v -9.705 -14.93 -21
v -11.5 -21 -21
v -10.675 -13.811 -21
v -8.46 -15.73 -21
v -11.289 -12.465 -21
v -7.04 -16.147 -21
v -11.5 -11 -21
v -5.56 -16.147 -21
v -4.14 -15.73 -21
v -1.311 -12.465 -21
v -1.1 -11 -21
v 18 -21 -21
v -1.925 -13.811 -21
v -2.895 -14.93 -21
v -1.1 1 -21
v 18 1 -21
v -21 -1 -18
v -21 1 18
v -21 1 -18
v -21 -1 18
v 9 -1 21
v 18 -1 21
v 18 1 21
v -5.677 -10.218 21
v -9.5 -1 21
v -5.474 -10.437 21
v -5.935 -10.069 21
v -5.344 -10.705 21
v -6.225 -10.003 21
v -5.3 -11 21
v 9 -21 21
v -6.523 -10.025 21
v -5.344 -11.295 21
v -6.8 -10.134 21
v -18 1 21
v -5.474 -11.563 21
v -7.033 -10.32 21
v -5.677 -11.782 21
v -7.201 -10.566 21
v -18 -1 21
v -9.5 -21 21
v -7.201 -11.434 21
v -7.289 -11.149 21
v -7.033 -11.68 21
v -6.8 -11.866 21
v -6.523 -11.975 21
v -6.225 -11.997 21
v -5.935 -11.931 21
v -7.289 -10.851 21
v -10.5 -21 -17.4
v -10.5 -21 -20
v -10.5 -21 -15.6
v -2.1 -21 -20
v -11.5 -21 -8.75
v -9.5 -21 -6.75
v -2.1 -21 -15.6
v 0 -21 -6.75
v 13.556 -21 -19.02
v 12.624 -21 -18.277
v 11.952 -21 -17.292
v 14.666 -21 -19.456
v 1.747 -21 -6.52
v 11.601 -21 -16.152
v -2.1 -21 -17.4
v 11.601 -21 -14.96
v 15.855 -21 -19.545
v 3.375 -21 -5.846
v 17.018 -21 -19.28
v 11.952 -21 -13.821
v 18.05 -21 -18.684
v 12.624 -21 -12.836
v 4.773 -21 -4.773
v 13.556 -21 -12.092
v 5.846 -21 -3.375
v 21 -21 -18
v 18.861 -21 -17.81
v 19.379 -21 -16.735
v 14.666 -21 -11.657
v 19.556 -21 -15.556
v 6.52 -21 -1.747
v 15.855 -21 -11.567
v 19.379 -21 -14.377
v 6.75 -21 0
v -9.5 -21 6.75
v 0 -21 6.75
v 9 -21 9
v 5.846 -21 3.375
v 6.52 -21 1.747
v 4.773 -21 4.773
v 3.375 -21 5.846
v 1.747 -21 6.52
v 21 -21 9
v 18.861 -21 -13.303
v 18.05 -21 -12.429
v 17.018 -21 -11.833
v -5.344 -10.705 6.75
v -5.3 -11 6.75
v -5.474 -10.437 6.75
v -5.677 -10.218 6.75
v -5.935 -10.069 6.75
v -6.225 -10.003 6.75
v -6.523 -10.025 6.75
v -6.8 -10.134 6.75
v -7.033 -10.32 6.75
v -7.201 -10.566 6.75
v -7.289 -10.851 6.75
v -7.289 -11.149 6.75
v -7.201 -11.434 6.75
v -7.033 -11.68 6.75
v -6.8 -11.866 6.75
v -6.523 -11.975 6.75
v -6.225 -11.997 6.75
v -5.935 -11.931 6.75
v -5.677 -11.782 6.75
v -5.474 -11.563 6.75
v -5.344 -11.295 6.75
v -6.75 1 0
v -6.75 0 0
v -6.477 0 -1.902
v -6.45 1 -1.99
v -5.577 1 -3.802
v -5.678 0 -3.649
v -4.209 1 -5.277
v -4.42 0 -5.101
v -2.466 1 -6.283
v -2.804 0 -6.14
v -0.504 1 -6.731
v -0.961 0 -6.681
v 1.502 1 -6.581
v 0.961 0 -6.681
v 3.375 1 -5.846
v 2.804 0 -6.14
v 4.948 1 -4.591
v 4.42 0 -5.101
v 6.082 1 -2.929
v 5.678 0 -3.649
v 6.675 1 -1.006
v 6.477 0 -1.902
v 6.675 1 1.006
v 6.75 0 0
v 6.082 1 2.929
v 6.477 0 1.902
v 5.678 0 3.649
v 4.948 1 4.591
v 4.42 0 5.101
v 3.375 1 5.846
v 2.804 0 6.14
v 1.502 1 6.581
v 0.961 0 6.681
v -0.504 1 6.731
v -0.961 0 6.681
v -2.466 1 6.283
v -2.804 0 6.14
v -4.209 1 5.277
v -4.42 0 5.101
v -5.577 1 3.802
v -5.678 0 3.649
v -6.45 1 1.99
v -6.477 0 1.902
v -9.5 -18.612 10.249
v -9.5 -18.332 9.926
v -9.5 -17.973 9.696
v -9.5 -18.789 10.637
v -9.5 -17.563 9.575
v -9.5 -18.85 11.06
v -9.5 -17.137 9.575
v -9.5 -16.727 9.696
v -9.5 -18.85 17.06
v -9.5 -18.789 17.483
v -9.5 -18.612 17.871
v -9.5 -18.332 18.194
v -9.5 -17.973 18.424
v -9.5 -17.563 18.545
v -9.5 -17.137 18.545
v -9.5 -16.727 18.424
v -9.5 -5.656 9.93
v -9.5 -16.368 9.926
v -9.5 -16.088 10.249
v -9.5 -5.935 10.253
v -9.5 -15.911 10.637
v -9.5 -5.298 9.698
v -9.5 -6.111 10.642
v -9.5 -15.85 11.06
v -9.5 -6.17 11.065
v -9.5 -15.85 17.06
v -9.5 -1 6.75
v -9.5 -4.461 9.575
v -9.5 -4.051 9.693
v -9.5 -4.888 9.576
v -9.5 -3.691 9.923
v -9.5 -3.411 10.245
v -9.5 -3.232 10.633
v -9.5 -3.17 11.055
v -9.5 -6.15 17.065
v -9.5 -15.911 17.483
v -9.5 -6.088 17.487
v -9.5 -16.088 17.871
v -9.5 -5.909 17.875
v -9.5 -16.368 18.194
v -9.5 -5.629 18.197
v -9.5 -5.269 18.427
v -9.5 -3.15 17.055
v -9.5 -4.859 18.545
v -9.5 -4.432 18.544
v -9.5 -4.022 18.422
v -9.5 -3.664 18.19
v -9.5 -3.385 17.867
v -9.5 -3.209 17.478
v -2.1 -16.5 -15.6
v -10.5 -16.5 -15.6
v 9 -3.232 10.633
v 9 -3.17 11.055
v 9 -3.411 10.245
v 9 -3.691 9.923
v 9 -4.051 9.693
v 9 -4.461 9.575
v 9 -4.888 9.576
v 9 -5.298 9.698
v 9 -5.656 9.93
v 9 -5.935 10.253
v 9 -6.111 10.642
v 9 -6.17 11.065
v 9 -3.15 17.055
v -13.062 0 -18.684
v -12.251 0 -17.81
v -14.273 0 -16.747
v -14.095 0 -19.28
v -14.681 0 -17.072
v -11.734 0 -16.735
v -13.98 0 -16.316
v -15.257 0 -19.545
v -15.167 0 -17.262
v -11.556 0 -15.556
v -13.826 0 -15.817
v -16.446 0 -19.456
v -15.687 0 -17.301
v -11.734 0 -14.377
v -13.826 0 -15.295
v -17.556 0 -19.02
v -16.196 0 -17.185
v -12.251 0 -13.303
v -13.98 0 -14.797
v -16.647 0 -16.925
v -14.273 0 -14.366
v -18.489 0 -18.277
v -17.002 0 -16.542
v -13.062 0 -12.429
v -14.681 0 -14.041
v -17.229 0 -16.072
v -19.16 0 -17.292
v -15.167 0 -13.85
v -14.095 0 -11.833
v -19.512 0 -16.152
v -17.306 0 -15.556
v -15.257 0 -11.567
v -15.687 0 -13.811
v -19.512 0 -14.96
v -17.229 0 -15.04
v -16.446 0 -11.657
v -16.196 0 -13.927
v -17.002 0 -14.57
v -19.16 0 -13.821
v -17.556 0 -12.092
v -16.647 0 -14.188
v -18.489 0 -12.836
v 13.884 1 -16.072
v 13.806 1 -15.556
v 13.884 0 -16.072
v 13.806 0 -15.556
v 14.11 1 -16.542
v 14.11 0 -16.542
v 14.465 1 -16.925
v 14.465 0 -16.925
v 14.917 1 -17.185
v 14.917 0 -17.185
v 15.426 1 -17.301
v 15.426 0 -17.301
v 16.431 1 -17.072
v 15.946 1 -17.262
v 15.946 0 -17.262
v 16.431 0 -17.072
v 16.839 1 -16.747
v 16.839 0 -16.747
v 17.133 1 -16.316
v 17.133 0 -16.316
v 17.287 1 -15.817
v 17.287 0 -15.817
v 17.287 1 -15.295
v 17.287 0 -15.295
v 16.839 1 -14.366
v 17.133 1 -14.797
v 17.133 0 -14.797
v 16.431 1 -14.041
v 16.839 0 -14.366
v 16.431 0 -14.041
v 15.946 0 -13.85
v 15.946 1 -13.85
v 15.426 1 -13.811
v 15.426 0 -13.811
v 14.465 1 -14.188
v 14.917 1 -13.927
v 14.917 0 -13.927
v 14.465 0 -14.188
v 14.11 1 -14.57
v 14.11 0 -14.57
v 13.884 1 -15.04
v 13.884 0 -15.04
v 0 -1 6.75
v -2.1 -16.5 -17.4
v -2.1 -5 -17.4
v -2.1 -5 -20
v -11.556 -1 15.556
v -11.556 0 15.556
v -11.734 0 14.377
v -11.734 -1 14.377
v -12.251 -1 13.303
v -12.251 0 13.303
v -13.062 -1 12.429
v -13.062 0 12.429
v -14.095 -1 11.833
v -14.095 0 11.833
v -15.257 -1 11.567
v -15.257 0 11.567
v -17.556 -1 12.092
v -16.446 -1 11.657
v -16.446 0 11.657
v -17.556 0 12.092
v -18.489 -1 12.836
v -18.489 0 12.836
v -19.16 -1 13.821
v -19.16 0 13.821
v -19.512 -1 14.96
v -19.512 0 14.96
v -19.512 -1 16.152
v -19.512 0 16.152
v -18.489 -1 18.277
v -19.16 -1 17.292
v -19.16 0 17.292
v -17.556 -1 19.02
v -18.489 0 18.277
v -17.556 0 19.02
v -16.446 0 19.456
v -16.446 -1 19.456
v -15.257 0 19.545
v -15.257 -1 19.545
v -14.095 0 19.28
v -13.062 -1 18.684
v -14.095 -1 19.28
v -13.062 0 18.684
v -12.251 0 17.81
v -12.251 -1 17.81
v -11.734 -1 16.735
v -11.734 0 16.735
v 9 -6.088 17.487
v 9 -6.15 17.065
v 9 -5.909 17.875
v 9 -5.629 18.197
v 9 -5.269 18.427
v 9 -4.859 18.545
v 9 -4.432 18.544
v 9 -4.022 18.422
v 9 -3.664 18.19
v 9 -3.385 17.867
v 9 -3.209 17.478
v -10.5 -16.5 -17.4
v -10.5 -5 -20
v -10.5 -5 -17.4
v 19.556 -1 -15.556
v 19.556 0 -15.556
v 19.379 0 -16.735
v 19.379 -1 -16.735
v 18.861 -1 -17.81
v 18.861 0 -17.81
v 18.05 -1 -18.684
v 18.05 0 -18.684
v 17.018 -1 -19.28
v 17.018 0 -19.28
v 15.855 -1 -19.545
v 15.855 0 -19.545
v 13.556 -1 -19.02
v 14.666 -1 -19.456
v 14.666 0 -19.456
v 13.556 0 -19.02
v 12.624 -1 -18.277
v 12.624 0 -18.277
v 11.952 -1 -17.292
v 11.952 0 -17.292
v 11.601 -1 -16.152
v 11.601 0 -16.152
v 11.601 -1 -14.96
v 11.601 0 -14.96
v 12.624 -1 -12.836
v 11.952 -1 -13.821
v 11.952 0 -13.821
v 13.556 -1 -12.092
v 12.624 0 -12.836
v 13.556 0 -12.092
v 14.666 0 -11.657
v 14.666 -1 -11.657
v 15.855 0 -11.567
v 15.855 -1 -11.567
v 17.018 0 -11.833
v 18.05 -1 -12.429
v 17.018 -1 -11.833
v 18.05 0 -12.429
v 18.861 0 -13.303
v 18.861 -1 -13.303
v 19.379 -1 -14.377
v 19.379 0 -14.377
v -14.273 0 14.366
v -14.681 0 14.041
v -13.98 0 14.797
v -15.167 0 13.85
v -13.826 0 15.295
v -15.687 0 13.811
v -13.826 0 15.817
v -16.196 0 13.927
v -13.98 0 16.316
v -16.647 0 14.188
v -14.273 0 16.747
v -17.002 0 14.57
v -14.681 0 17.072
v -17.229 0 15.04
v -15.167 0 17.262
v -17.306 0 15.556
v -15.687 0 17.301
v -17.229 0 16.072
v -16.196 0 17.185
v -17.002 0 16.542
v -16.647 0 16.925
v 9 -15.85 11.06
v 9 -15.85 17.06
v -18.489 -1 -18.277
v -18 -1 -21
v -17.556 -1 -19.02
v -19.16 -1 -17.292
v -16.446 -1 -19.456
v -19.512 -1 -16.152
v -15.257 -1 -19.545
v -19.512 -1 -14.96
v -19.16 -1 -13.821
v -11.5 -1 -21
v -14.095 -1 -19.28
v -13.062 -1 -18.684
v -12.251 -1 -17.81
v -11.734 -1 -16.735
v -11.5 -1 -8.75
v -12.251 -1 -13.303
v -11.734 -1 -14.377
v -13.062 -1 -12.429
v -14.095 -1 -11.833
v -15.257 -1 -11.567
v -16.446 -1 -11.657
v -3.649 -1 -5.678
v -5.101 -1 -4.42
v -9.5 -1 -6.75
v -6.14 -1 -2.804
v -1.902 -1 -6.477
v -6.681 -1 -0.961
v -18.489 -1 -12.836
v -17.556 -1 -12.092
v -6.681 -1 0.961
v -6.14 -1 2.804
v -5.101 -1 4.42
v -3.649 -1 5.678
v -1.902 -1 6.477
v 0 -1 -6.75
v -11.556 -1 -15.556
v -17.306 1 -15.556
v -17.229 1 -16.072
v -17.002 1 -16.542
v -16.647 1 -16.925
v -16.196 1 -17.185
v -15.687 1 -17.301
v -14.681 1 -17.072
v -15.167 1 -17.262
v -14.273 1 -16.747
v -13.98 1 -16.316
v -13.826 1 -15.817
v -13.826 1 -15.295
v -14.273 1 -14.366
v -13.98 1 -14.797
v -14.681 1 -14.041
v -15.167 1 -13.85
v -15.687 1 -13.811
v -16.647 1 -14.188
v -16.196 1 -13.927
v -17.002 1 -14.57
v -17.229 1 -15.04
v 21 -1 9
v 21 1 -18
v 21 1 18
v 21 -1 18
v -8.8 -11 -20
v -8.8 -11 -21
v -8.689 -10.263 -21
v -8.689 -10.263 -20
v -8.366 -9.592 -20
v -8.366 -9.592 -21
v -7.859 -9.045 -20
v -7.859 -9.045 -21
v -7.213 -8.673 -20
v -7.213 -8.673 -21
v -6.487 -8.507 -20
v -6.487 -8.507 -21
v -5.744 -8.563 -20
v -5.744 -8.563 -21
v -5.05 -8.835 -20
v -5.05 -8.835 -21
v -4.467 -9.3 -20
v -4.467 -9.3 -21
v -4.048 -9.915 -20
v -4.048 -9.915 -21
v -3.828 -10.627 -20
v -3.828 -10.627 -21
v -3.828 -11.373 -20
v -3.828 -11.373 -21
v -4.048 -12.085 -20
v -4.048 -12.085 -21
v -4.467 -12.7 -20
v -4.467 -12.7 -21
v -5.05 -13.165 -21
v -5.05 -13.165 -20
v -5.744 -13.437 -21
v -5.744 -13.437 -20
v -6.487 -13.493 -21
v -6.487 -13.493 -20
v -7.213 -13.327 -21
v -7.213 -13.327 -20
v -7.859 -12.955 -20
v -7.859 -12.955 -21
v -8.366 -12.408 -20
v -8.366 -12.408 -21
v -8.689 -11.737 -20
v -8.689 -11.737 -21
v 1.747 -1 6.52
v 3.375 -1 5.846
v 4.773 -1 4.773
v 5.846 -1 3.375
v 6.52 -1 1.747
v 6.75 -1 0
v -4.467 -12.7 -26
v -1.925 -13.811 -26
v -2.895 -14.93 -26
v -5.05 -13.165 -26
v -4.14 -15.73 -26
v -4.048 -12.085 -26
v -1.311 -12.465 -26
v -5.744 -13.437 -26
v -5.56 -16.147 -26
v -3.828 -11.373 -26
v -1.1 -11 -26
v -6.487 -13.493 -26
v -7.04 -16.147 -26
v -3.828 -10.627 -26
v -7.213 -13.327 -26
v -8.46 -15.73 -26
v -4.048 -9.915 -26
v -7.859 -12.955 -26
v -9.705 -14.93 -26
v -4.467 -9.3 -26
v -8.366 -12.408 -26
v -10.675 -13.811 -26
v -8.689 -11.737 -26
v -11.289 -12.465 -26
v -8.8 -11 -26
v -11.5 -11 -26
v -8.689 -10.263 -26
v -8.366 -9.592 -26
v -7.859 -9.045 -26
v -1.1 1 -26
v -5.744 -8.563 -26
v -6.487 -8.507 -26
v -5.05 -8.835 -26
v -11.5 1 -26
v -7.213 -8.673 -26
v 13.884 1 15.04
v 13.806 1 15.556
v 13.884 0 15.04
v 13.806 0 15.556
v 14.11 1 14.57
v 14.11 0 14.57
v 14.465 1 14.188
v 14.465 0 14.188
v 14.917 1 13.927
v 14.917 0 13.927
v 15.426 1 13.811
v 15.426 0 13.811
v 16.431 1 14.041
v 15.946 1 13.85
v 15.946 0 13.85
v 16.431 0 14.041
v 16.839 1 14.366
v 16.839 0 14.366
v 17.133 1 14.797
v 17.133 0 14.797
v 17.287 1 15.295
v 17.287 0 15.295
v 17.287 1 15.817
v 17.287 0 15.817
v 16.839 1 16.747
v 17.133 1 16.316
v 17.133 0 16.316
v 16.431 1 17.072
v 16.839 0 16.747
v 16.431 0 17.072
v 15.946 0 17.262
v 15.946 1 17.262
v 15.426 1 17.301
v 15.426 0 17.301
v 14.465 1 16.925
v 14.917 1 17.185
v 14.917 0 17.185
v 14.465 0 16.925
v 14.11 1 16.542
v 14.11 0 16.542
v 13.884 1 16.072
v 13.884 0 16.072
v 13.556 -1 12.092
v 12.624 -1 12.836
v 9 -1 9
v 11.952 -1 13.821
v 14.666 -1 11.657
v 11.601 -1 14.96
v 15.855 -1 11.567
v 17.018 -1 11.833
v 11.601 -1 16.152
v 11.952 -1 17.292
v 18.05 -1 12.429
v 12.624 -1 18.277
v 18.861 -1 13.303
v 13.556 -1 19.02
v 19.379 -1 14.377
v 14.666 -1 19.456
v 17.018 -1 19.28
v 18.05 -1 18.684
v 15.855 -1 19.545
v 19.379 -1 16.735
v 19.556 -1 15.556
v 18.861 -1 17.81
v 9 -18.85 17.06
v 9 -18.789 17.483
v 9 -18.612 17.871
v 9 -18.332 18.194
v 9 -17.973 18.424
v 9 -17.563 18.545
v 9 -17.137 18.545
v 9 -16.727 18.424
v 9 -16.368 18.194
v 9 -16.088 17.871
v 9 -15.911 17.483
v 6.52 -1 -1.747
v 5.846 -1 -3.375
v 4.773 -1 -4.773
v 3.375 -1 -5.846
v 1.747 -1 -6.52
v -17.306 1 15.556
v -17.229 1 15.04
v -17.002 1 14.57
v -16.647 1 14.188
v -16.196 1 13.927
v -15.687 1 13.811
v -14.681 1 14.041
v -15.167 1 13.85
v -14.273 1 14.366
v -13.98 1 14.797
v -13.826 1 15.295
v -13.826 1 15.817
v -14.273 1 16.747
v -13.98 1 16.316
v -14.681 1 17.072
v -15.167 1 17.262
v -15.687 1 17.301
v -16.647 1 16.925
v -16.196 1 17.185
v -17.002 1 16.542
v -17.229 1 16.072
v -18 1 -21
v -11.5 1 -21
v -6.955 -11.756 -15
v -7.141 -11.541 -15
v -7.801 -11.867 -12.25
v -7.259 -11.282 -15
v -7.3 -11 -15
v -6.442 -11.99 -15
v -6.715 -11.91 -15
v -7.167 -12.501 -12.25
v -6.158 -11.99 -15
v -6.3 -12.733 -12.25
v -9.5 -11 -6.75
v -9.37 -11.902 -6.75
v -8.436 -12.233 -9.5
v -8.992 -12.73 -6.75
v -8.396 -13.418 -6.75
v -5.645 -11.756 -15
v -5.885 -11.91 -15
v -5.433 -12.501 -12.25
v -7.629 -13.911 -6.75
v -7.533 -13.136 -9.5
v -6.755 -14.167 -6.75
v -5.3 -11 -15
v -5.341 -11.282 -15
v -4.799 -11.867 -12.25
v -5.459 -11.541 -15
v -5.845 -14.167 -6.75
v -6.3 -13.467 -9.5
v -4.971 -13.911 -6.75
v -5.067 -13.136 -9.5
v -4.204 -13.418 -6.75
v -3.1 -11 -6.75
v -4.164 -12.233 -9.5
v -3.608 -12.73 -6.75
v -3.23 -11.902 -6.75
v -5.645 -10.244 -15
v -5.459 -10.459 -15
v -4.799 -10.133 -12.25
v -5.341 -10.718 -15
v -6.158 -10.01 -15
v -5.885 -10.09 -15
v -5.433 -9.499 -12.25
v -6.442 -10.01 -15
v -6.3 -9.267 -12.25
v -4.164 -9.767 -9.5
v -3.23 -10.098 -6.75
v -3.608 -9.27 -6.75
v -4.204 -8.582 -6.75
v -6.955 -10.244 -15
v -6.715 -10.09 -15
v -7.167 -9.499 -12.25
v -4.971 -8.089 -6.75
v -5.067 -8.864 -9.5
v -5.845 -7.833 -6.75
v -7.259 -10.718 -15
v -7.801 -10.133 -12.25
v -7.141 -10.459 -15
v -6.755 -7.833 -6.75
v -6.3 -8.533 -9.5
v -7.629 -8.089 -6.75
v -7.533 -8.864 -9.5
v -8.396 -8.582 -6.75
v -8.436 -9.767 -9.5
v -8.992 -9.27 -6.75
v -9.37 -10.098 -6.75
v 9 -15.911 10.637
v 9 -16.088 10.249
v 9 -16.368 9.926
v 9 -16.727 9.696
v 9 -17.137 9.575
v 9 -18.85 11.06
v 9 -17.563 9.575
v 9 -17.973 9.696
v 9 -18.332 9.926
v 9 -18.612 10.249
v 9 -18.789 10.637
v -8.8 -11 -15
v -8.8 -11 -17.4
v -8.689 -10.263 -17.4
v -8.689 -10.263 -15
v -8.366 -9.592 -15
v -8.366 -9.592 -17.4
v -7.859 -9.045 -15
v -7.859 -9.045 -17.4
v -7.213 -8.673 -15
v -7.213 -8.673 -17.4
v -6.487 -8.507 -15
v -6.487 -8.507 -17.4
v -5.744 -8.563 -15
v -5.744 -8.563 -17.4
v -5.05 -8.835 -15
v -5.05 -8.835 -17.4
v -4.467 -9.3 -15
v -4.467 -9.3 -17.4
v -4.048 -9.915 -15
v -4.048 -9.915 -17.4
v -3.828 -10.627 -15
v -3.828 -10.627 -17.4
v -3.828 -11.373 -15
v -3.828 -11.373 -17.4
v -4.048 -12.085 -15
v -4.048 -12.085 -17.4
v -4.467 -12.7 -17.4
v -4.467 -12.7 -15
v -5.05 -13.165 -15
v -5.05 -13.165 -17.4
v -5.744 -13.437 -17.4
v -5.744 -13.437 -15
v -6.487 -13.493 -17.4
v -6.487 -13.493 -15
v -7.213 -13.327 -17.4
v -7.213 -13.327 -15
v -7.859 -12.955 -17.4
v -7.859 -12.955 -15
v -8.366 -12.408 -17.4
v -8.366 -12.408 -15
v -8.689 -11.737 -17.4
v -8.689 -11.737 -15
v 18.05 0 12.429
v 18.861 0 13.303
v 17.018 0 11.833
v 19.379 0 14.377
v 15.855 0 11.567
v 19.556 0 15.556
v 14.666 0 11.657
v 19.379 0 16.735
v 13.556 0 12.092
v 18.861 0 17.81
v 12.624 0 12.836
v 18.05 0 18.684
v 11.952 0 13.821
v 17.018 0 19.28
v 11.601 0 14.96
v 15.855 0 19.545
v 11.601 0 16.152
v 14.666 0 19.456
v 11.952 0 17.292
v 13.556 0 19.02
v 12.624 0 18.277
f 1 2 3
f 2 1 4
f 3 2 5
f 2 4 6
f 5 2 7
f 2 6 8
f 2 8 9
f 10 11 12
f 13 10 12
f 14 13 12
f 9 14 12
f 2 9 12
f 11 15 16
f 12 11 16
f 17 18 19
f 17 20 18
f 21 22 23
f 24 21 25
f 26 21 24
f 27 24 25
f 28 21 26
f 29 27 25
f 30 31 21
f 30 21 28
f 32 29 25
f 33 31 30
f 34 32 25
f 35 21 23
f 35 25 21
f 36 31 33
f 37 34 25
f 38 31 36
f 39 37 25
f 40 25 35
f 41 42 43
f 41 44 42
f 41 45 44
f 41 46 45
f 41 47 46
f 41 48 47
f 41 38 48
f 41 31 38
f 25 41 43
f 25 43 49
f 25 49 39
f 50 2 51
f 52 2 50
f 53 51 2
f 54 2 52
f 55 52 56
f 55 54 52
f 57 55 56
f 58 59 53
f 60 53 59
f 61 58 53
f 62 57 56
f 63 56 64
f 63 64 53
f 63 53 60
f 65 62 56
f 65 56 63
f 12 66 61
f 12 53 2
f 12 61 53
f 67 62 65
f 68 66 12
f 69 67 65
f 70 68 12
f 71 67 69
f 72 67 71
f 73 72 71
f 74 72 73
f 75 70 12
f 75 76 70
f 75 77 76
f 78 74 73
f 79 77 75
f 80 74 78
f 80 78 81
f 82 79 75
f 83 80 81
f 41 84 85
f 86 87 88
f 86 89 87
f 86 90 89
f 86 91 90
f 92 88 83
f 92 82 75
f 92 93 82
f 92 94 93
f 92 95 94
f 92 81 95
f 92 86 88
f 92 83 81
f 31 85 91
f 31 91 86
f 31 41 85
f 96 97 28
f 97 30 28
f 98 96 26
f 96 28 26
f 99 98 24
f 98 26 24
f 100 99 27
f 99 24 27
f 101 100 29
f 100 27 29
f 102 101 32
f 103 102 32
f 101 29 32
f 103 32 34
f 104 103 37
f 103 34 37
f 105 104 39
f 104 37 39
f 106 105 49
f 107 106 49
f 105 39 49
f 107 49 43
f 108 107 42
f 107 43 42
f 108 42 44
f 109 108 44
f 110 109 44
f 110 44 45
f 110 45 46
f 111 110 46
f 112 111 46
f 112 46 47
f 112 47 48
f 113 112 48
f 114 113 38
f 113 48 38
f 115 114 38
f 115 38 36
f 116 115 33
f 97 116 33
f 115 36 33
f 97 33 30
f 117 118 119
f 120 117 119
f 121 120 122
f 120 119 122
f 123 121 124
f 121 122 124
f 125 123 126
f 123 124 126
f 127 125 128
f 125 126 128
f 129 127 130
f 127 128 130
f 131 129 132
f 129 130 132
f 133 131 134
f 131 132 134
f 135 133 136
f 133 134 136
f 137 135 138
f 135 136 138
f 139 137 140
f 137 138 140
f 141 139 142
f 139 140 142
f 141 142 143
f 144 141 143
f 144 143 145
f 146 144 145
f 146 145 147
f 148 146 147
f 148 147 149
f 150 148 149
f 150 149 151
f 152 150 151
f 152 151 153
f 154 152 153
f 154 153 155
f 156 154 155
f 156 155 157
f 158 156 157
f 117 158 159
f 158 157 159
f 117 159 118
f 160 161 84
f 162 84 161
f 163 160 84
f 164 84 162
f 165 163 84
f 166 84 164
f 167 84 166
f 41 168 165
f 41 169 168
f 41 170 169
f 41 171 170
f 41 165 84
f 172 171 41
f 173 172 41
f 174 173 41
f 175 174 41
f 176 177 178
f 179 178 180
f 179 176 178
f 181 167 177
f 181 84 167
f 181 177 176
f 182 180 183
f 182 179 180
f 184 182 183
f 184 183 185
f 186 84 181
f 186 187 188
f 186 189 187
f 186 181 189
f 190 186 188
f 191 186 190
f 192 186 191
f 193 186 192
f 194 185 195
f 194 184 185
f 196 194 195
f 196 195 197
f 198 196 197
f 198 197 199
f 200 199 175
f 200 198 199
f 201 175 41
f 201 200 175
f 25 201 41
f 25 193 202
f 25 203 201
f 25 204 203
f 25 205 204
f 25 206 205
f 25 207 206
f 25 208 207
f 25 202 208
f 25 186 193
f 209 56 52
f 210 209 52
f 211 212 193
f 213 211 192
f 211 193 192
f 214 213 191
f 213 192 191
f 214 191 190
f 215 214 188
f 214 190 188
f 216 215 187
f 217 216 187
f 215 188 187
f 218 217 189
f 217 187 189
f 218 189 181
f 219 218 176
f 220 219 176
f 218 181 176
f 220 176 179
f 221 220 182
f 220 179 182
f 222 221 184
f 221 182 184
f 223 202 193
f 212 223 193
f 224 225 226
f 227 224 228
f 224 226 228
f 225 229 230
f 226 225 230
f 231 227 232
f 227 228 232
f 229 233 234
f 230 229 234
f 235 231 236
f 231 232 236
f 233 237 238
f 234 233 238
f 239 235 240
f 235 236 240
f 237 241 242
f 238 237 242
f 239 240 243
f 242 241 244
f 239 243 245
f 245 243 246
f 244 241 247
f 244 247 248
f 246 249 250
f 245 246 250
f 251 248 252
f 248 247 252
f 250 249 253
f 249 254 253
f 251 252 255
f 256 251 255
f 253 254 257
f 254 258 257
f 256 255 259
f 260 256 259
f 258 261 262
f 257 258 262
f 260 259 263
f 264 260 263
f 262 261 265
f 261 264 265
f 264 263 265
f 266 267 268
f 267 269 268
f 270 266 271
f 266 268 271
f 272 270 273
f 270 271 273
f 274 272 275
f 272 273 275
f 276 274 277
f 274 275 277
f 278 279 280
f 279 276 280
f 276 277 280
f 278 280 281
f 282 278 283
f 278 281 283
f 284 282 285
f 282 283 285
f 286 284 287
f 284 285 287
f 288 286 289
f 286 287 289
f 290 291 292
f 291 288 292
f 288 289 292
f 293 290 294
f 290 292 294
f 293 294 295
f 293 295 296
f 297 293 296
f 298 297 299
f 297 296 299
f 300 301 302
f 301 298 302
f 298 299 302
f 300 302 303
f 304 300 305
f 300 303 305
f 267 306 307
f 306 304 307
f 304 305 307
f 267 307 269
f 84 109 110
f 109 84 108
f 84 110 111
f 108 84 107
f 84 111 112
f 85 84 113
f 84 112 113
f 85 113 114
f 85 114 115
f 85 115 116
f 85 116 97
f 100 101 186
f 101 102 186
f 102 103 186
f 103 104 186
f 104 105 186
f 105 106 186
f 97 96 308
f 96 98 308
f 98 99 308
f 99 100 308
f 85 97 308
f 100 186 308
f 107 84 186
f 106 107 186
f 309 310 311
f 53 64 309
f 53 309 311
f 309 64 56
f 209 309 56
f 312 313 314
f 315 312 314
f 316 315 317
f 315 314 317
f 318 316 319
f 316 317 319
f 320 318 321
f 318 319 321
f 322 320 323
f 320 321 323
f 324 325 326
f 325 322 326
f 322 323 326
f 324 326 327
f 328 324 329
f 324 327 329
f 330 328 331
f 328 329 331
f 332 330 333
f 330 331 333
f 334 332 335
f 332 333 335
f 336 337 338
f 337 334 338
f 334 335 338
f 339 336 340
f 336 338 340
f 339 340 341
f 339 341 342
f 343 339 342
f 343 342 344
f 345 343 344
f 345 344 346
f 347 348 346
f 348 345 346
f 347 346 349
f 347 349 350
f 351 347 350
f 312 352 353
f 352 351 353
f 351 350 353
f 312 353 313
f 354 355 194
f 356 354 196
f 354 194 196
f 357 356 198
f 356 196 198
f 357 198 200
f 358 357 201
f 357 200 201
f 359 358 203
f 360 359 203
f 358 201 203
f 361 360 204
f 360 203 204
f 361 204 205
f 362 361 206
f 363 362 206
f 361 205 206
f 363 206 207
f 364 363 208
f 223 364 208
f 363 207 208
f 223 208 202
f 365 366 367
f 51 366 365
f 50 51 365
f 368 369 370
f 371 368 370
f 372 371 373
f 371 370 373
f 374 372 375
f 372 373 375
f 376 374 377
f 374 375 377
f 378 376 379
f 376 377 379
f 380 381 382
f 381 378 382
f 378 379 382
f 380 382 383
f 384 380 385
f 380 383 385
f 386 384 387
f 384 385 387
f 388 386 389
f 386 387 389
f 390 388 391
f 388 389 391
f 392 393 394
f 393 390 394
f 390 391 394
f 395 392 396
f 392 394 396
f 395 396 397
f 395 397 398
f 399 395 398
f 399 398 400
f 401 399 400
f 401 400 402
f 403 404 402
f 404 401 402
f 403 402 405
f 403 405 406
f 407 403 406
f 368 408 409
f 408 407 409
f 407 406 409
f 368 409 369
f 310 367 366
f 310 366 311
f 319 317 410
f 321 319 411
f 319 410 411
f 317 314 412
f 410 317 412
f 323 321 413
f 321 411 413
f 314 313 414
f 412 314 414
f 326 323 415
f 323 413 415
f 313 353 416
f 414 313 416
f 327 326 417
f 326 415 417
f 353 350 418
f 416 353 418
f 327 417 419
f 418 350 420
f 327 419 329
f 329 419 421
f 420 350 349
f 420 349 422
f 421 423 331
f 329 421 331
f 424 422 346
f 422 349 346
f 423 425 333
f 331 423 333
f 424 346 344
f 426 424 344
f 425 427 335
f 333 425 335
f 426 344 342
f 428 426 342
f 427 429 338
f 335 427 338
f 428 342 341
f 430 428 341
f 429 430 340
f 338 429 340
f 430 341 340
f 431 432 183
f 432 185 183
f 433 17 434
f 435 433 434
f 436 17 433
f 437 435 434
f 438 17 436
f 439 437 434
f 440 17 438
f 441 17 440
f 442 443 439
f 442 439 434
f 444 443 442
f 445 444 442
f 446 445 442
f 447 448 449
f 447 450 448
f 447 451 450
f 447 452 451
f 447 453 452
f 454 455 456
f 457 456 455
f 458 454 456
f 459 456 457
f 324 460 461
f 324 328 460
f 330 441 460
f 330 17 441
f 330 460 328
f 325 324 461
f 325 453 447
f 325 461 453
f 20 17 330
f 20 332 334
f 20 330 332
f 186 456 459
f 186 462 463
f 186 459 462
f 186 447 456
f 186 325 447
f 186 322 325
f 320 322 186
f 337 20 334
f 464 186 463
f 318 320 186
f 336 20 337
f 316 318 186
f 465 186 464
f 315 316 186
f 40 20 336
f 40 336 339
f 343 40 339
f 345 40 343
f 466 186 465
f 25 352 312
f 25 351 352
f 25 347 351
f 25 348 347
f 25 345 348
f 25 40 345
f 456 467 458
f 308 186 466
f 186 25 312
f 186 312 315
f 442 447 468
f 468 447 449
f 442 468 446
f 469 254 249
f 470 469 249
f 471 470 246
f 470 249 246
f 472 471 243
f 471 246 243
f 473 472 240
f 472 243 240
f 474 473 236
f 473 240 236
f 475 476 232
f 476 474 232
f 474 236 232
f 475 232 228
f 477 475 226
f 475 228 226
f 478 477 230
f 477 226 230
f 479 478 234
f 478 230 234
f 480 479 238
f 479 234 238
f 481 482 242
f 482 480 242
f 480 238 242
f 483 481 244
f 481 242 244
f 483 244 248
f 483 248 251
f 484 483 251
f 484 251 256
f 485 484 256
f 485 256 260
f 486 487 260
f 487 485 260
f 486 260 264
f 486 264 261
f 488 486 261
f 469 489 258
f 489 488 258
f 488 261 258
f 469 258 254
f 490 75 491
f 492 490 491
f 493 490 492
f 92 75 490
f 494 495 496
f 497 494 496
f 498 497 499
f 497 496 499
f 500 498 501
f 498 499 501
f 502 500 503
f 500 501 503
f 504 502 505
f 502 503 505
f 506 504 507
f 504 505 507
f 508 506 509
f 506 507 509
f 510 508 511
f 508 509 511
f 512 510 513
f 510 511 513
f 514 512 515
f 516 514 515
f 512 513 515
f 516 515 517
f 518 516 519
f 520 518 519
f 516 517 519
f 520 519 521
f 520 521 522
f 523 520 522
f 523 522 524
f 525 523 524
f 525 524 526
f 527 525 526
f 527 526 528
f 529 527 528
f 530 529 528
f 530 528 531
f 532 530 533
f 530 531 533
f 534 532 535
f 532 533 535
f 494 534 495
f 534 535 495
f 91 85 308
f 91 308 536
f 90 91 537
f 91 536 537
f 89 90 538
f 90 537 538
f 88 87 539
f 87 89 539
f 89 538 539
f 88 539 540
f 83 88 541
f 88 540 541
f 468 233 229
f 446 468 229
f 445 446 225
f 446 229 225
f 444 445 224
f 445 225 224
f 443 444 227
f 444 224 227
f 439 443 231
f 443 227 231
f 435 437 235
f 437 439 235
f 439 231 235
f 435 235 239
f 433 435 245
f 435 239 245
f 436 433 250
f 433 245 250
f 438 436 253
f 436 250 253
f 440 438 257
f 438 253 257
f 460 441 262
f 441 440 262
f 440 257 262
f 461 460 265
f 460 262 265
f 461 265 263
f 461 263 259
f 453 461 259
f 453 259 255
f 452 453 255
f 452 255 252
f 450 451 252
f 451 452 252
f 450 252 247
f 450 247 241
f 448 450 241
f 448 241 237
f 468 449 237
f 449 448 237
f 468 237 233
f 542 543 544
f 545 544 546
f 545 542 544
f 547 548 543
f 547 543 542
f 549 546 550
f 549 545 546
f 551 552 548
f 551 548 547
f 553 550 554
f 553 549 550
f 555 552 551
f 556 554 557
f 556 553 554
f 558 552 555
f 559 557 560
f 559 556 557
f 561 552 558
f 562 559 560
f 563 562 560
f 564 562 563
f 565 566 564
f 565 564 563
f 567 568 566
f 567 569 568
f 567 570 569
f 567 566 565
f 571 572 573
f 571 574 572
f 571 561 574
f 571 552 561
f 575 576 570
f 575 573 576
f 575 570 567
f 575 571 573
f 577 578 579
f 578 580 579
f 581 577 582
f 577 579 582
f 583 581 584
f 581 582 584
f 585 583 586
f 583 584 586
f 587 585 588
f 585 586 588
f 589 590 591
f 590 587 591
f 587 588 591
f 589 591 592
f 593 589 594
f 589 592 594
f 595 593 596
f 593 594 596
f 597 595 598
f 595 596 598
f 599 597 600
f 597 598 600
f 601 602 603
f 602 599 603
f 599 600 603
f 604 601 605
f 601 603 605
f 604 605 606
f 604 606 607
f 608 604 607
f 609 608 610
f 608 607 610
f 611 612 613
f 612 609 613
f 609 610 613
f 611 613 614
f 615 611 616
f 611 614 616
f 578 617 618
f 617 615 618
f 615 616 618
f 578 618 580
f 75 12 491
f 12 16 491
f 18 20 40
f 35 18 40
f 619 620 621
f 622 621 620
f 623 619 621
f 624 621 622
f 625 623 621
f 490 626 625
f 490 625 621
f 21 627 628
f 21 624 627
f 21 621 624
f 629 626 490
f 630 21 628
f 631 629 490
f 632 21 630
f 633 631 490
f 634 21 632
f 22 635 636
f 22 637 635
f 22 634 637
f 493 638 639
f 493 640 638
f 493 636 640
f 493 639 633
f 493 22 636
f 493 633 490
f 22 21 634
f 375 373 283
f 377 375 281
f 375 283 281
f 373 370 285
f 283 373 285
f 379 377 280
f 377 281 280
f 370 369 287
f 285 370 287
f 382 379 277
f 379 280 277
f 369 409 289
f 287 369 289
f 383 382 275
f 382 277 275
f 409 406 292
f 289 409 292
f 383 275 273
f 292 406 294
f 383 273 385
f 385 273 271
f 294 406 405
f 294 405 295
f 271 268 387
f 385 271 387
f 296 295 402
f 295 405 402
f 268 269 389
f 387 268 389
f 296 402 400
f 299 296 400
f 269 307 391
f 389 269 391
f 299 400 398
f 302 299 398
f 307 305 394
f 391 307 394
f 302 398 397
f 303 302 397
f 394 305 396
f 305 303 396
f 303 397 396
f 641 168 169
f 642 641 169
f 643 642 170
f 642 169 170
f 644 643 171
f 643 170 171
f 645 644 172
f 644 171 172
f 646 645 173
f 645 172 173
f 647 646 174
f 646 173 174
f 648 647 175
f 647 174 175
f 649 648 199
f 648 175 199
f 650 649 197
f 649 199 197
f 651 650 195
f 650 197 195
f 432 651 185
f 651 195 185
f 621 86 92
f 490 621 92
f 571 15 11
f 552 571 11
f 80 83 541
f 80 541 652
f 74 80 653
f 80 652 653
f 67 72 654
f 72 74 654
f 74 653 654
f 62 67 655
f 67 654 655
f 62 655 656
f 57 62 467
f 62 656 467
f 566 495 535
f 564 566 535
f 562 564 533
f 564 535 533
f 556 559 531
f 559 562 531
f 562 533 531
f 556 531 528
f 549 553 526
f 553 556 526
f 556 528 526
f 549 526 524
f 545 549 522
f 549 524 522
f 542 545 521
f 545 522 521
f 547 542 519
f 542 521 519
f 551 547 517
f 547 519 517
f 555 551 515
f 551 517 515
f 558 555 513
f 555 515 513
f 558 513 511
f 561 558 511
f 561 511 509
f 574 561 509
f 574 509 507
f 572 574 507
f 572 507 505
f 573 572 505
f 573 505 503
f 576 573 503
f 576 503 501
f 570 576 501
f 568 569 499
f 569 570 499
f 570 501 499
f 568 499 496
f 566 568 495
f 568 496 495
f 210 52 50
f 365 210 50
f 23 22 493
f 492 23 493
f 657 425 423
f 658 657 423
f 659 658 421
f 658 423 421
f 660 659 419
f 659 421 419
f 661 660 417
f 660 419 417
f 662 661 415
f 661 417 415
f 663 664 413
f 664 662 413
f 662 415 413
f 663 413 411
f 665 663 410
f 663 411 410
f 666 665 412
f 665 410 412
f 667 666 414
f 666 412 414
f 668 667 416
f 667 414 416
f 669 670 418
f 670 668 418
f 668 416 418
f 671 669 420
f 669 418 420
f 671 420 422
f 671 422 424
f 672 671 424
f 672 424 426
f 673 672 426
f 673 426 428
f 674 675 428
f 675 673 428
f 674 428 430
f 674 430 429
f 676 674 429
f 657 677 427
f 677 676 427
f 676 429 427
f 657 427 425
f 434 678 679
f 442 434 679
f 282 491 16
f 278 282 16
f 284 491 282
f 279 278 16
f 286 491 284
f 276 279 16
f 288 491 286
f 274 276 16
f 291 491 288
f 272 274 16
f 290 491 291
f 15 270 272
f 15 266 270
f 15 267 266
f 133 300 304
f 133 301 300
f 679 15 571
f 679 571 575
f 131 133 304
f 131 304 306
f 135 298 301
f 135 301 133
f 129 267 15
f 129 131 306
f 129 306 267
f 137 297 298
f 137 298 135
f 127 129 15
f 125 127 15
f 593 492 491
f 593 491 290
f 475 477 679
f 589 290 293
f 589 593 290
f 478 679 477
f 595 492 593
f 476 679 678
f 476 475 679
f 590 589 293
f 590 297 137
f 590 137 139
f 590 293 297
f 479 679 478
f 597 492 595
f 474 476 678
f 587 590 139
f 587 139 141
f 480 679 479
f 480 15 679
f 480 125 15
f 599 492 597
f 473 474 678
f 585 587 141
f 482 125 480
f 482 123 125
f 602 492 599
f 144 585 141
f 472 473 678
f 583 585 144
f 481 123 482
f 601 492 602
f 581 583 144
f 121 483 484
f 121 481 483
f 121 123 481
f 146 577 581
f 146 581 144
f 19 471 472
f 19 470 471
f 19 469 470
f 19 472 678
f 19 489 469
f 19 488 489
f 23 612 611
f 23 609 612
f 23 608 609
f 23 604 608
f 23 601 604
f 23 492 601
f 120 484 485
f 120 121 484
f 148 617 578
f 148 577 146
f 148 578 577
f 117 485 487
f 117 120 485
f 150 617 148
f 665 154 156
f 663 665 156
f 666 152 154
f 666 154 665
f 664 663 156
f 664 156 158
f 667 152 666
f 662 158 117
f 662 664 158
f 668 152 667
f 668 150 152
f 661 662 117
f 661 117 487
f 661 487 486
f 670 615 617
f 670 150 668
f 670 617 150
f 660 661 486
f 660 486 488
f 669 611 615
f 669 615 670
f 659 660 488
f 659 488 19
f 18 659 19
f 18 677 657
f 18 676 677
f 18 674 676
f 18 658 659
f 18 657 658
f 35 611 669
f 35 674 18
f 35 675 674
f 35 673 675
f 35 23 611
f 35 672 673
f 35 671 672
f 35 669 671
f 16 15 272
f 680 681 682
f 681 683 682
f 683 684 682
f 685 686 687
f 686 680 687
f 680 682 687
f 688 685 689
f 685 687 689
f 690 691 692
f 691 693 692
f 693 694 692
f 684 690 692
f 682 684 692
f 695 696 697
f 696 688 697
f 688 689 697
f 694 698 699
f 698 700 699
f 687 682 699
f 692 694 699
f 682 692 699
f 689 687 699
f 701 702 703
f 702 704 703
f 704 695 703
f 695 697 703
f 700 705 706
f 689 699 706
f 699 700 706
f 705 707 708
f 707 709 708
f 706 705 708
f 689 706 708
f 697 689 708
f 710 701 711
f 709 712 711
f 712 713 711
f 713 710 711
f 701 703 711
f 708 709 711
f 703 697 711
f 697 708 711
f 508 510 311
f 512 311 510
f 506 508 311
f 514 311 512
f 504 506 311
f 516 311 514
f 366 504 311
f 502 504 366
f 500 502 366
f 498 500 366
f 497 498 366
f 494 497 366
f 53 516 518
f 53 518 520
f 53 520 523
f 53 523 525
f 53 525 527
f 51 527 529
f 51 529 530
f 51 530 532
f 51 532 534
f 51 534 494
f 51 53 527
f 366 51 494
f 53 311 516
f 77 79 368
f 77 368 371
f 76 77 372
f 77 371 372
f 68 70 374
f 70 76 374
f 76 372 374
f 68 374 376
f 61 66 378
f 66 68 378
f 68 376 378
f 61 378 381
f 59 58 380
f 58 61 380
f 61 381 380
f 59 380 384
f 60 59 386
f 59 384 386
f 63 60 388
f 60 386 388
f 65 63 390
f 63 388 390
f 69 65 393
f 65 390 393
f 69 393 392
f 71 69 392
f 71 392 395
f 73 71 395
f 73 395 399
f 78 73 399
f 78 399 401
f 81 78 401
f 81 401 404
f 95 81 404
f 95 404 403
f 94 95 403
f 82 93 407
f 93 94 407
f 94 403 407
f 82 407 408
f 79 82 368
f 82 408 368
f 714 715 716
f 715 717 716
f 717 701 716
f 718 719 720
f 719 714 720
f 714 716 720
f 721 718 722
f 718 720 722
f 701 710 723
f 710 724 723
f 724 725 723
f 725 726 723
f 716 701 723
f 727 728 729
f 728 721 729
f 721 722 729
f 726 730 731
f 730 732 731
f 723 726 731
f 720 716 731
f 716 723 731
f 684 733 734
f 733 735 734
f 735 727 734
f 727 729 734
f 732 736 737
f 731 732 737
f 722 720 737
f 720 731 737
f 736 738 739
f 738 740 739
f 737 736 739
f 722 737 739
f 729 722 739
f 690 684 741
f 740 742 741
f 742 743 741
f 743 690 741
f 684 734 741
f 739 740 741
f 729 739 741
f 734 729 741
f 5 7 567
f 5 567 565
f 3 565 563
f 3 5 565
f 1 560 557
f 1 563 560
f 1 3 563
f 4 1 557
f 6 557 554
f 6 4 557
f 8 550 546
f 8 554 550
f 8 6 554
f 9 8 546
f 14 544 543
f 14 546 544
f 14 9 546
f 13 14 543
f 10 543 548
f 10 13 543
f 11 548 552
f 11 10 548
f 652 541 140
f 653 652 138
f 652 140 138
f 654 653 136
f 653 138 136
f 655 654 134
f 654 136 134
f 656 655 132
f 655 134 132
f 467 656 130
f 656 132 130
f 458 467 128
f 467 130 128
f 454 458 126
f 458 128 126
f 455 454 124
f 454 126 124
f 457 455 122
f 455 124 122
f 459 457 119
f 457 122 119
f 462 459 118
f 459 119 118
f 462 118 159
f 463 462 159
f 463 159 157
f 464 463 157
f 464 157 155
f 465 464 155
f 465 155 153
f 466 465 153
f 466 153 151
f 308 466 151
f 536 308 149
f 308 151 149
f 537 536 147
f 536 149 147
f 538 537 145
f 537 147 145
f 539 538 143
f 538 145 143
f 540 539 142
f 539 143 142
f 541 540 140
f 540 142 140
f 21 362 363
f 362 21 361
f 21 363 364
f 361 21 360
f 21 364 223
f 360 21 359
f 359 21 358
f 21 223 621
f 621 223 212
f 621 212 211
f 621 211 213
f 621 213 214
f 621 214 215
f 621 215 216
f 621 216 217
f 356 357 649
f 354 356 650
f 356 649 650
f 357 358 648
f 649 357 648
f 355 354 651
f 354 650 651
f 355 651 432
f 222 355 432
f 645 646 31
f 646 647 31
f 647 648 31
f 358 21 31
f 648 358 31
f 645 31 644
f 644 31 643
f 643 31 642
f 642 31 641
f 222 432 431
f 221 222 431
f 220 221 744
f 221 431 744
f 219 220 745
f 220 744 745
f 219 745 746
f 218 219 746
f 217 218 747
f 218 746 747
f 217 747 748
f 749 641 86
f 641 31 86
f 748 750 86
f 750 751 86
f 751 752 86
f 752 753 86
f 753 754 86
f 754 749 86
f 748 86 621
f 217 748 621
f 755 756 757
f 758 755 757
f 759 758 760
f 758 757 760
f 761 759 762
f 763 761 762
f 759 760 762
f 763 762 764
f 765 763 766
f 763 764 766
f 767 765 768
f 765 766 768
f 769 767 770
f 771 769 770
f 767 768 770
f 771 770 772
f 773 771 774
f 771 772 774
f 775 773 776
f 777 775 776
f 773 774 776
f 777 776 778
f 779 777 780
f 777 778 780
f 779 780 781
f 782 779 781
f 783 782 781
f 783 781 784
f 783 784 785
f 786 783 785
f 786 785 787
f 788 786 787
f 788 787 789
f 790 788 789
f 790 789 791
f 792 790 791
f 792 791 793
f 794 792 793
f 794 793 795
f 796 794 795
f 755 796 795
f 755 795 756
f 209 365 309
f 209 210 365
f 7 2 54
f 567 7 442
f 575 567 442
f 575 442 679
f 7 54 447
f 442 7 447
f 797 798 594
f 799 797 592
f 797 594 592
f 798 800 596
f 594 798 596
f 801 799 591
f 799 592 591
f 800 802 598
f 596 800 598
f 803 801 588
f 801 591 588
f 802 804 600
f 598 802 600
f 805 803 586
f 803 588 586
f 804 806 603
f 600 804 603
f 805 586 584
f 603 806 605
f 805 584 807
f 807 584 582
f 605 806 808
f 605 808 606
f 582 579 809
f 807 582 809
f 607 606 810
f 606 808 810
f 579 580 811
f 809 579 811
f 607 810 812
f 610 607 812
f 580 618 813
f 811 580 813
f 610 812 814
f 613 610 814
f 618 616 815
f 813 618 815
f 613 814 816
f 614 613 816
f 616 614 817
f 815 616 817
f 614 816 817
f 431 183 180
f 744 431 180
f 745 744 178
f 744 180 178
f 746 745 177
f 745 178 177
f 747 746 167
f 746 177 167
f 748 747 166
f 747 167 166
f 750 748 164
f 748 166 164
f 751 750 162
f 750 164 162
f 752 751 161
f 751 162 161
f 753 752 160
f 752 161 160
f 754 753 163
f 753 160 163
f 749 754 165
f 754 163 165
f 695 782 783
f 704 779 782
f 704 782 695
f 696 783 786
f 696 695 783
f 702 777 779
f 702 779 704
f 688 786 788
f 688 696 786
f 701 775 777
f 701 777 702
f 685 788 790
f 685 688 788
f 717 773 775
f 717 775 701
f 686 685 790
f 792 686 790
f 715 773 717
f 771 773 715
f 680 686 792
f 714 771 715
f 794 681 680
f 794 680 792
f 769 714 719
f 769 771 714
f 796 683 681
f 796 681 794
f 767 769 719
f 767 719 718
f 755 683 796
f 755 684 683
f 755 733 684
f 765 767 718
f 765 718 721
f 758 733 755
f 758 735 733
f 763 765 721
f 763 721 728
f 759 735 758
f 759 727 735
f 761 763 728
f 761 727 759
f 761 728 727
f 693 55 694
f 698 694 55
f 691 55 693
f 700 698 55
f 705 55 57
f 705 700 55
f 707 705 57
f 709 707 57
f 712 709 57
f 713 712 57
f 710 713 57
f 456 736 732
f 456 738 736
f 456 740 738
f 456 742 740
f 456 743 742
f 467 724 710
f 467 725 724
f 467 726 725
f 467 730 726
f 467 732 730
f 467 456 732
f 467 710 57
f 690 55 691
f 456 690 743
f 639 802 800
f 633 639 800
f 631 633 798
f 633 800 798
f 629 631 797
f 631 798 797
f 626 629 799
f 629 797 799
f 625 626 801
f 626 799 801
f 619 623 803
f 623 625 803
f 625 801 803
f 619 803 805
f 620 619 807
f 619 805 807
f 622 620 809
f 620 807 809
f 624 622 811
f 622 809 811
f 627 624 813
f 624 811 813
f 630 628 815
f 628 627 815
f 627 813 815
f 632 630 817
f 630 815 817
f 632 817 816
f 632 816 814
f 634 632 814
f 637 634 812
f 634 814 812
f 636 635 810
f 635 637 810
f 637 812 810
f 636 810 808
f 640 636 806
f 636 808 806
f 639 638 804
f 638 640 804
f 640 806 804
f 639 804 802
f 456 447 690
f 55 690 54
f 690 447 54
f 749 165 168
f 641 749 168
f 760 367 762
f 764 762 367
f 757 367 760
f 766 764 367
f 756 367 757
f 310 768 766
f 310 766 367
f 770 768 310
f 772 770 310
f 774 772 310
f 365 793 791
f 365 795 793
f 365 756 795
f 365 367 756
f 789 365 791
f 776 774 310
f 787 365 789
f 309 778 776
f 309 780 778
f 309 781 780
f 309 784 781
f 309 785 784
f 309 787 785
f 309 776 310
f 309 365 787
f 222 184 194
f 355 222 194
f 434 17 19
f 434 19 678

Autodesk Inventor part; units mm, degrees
ref_plane "YZ Plane" through (0, 0, 0) normal (1, 0, 0) x (0, 1, 0)
ref_plane "XZ Plane" through (0, 0, 0) normal (0, 1, 0) x (-1, 0, 0)
ref_plane "XY Plane" through (0, 0, 0) normal (0, 0, 1) x (1, 0, 0)
sketch "Sketch1" plane through (0, 0, 0) normal (0, 1, 0) x (-1, 0, 0)
  line L0 (18, -21) -> (-18, -21)
  line L1 (-21, -18) -> (-21, 18)
  line L2 (-18, 21) -> (18, 21)
  line L3 (21, 18) -> (21, -18)
  line L4 (21, -21) -> (-21, 21) construction
  line L5 (-21, -21) -> (21, 21) construction
  line L6 (21, 18) -> (18, 21)
  line L7 (-21, -18) -> (-18, -21)
  line L8 (-18, 21) -> (-21, 18)
  line L9 (21, -18) -> (18, -21)
  line L10 (19.5, 19.5) -> (15.0999, 15.0999) construction
  circle A0 centre (15.5563, 15.5563) radius 1.75
  circle A1 centre (-15.5563, 15.5563) radius 1.75
  circle A2 centre (-15.5563, -15.5563) radius 1.75
  circle A3 centre (15.5563, -15.5563) radius 1.75
  circle A4 centre (0, 0) radius 6.75
  line L11 (-15.5563, 15.5563) -> (15.5563, -15.5563) construction
  dimension "d0" = 42
  dimension "d1" = 42
  dimension "d2" = 3
  dimension "d3" = 3
  dimension "d4" = 3
  dimension "d5" = 3
  dimension "d6" = 3
  dimension "d7" = 3
  dimension "d8" = 3
  dimension "d9" = 3
  dimension "d11" = 3.5
  dimension "d14" = 360
  dimension "d16" = 13.5
  dimension "d20" = 22
extrude "Extrusion1" add sketch "Sketch1" along normal blind 1
sketch "Sketch3" plane through (0, 0, 0) normal (0, -1, 0) x (1, 0, 0)
  circle A0 centre (0, 0) radius 6.75 projected
  circle A1 centre (-15.5563, 15.5563) radius 1.75 projected
  line L0 (-21, 18) -> (-18, 21) projected
  line L1 (-21, -18) -> (-21, 18) projected
  line L2 (-18, -21) -> (-21, -18) projected
  line L3 (18, -21) -> (-18, -21) projected
  line L4 (21, -18) -> (18, -21) projected
  line L5 (21, 18) -> (21, -18) projected
  line L6 (18, 21) -> (21, 18) projected
  line L7 (-18, 21) -> (18, 21) projected
  circle A2 centre (-15.5563, 15.5563) radius 4
  circle A3 centre (-15.5563, -15.5563) radius 4
  circle A4 centre (15.5563, -15.5563) radius 4
  circle A5 centre (15.5563, 15.5563) radius 4
  dimension "d28" = 8
  dimension "d31" = 360
extrude "Extrusion3" add sketch "Sketch3" along normal blind 1 contours L0 L7 L6 L5 L4 L3 L2 L1
sketch "Sketch4" plane through (0, -1, 0) normal (0, -1, 0) x (1, 0, 0)
  circle A0 centre (0, 0) radius 6.75
  circle A1 centre (15.5563, 15.5563) radius 4 projected
  circle A2 centre (15.5563, -15.5563) radius 4 projected
  line L0 (-18, -21) -> (18, -21) projected
  line L1 (18, -21) -> (21, -18) projected
  line L2 (21, -18) -> (21, 18) projected
  line L3 (21, 18) -> (18, 21) projected
  line L4 (18, 21) -> (-18, 21) projected
  line L5 (-9.5, 6.75) -> (-9.5, 21)
  line L6 (-11.5, -6.75) -> (-11.5, -21)
  line L7 (-11.5, -6.75) -> (0, -6.75)
  line L8 (-9.5, 6.75) -> (0, 6.75)
  line L9 (0, 0) -> (0, 21) construction
  line L10 (0, 0) -> (0, -21) construction
  line L11 (0, 0) -> (21, 0) construction
  line L12 (21, 18) -> (21, -18) construction
  line L13 (0, 0) -> (-21, 0) construction
  line L14 (-21, -18) -> (-21, 18) construction
  circle A3 centre (0, 0) radius 6.75 construction
  dimension "d39" = 32.5
  dimension "d40" = 30.5
  dimension "d103" = 13.5
extrude "Extrusion4" add sketch "Sketch4" along normal blind 20 contours A0 L8 L5 L4 L3 L2 L1 L0 L6 L7
chamfer "Chamfer1" distance 2 angle 45 1 edges at (-11.5, -11, -6.75)
sketch "Sketch5" plane through (-18, 1, 21) normal (0, 0, 1) x (1, 0, 0)
  line L0 (0, 0) -> (36, 0) projected
  circle A0 centre (11.7, -12) radius 1
  line L1 (6.5, -2) -> (6.5, -22) projected
  point P0 (18, -1)
  dimension "d46" = 2
  dimension "d47" = 12
  dimension "d108" = 5.2
extrude "Extrusion5" cut sketch "Sketch5" against normal blind 20
sketch "Sketch6" plane through (18, 1, -21) normal (0, 0, -1) x (-1, 0, 0)
  line L0 (0, 0) -> (36, 0) projected
  circle A0 centre (24.3, -12) radius 2.5
  line L1 (29.5, -2) -> (29.5, -22) projected
  line L2 (29.5, -22) -> (0, -22) projected
  point P0 (18, -1)
  dimension "d51" = 5
  dimension "d52" = 12
  dimension "d72" = 10
  dimension "d107" = 5.2
extrude "Extrusion6" cut sketch "Sketch6" against normal blind 6
sketch "Sketch7" plane through (0, -21, -6.75) normal (0, 0, 1) x (1, 0, 0)
  line L0 (-9.5, 0) -> (-9.5, 20) projected
  circle A0 centre (-6.3, 10) radius 3.2
  line L1 (-18, 22) -> (18, 22) projected
  line L2 (-11.5, 20) -> (-11.5, 0) projected
  point P0 (0, 21)
  dimension "d57" = 12
  dimension "d109" = 5.2
sketch "Sketch8" plane through (-6.3, -11, -15) normal (0, 0, -1) x (-1, 0, 0)
  circle A0 centre (0, 0) radius 2.5
  circle A1 centre (0, 0) radius 1
  line L0 (5.2, 10) -> (5.2, -10) projected
  line L1 (-6.3, 10) -> (3.2, 10) projected
  point P0 (-6.3, 11)
  dimension "d56" = 2
  dimension "d104" = 5.2
  dimension "d105" = 10
  dimension "d106" = 5
loft "Loft1" cut profiles "Sketch8", "Sketch7" contours A1 / all
sketch "Sketch9" plane through (0, -21, 0) normal (0, -1, 0) x (1, 0, 0)
  line L0 (-11.5, -8.75) -> (-11.5, -21) projected
  line L1 (-11.5, -21) -> (18, -21) projected
  line L2 (-10.5, -17.4) -> (-2.1, -17.4)
  line L3 (-2.1, -17.4) -> (-2.1, -20)
  line L4 (-2.1, -20) -> (-10.5, -20)
  line L5 (-10.5, -20) -> (-10.5, -17.4)
  dimension "d73" = 8.4
  dimension "d74" = 2.6
  dimension "d75" = 1
  dimension "d76" = 1
extrude "Extrusion8" cut sketch "Sketch9" against normal blind 16
sketch "Sketch12" plane through (0, -21, 0) normal (0, -1, 0) x (1, 0, 0)
  line L0 (-10.5, -17.4) -> (-2.1, -17.4)
  line L1 (-2.1, -17.4) -> (-2.1, -15.6)
  line L2 (-2.1, -15.6) -> (-10.5, -15.6)
  line L3 (-10.5, -15.6) -> (-10.5, -17.4)
  line L4 (-2.1, -20) -> (-10.5, -20) projected
  dimension "d79" = 1.8
extrude "Extrusion9" cut sketch "Sketch12" against normal blind 4.5
sketch "Sketch21" plane through (18, 1, -21) normal (0, 0, -1) x (-1, 0, 0)
  circle A0 centre (24.3, -12) radius 2.5 projected
  line L0 (0, 0) -> (36, 0) projected
  line L1 (29.5, -2) -> (29.5, -22) projected
  line L2 (29.5, -12) -> (29.5, 0)
  line L3 (29.5, 0) -> (19.1, 0)
  line L4 (19.1, 0) -> (19.1, -12)
  arc A1 (19.1, -12) -> (29.5, -12) centre (24.3, -12) ccw
  point P0 (29.5, -23)
  point P1 (18, -1)
extrude "Extrusion14" add sketch "Sketch21" along normal blind 5
sketch "Sketch23" plane through (-9.5, -1, 6.75) normal (-1, 0, 0) x (0, 0, 1)
  arc A0 (10.315, -5.15) -> (10.305, -2.15) centre (10.31, -3.65) ccw
  line L0 (14.25, 0) -> (14.25, -20) projected
  arc A1 (4.305, -2.17) -> (4.315, -5.17) centre (4.31, -3.67) ccw
  line L1 (11.25, 0) -> (-24.75, 0) projected
  line L2 (10.305, -2.15) -> (4.305, -2.17)
  line L3 (4.315, -5.17) -> (10.315, -5.15)
  arc A2 (10.31, -17.85) -> (10.31, -14.85) centre (10.31, -16.35) ccw
  arc A3 (4.31, -14.85) -> (4.31, -17.85) centre (4.31, -16.35) ccw
  line L4 (14.25, -20) -> (0, -20) projected
  line L5 (10.31, -14.85) -> (4.31, -14.85)
  line L6 (4.31, -17.85) -> (10.31, -17.85)
  point P0 (-6.75, 1)
  dimension "d110" = 3
  dimension "d111" = 3.94
  dimension "d112" = 3
  dimension "d113" = 9.94
  dimension "d114" = 3.65
  dimension "d115" = 3.67
  dimension "d116" = 3
  dimension "d117" = 3
  dimension "d118" = 3.94
  dimension "d119" = 9.94
  dimension "d120" = 3.65
  dimension "d121" = 3.65
extrude "Extrusion15" cut sketch "Sketch23" against normal blind 30.5
sketch "Sketch24" plane through (0, -21, 0) normal (0, -1, 0) x (1, 0, 0)
  line L0 (9, 21) -> (9, 9)
  line L1 (-9.5, 11.06) -> (21, 11.06) projected
  line L2 (9, 9) -> (21, 9)
  line L3 (21, -18) -> (21, 18) projected
  line L4 (18, 21) -> (-9.5, 21) projected
  line L5 (9, 21) -> (18, 21)
  line L6 (21, 18) -> (21, 9)
  line L7 (18, 21) -> (21, 18)
  line L8 (21, 18) -> (18, 21) projected
  point P0 (0, 0)
  dimension "d124" = 12
  dimension "d125" = 12
extrude "Extrusion16" cut sketch "Sketch24" against normal blind 20
equation "\"d3\" = d2"
equation "\"d5\" = d4"
equation "\"d7\" = d6"
equation "\"d9\" = d8"
